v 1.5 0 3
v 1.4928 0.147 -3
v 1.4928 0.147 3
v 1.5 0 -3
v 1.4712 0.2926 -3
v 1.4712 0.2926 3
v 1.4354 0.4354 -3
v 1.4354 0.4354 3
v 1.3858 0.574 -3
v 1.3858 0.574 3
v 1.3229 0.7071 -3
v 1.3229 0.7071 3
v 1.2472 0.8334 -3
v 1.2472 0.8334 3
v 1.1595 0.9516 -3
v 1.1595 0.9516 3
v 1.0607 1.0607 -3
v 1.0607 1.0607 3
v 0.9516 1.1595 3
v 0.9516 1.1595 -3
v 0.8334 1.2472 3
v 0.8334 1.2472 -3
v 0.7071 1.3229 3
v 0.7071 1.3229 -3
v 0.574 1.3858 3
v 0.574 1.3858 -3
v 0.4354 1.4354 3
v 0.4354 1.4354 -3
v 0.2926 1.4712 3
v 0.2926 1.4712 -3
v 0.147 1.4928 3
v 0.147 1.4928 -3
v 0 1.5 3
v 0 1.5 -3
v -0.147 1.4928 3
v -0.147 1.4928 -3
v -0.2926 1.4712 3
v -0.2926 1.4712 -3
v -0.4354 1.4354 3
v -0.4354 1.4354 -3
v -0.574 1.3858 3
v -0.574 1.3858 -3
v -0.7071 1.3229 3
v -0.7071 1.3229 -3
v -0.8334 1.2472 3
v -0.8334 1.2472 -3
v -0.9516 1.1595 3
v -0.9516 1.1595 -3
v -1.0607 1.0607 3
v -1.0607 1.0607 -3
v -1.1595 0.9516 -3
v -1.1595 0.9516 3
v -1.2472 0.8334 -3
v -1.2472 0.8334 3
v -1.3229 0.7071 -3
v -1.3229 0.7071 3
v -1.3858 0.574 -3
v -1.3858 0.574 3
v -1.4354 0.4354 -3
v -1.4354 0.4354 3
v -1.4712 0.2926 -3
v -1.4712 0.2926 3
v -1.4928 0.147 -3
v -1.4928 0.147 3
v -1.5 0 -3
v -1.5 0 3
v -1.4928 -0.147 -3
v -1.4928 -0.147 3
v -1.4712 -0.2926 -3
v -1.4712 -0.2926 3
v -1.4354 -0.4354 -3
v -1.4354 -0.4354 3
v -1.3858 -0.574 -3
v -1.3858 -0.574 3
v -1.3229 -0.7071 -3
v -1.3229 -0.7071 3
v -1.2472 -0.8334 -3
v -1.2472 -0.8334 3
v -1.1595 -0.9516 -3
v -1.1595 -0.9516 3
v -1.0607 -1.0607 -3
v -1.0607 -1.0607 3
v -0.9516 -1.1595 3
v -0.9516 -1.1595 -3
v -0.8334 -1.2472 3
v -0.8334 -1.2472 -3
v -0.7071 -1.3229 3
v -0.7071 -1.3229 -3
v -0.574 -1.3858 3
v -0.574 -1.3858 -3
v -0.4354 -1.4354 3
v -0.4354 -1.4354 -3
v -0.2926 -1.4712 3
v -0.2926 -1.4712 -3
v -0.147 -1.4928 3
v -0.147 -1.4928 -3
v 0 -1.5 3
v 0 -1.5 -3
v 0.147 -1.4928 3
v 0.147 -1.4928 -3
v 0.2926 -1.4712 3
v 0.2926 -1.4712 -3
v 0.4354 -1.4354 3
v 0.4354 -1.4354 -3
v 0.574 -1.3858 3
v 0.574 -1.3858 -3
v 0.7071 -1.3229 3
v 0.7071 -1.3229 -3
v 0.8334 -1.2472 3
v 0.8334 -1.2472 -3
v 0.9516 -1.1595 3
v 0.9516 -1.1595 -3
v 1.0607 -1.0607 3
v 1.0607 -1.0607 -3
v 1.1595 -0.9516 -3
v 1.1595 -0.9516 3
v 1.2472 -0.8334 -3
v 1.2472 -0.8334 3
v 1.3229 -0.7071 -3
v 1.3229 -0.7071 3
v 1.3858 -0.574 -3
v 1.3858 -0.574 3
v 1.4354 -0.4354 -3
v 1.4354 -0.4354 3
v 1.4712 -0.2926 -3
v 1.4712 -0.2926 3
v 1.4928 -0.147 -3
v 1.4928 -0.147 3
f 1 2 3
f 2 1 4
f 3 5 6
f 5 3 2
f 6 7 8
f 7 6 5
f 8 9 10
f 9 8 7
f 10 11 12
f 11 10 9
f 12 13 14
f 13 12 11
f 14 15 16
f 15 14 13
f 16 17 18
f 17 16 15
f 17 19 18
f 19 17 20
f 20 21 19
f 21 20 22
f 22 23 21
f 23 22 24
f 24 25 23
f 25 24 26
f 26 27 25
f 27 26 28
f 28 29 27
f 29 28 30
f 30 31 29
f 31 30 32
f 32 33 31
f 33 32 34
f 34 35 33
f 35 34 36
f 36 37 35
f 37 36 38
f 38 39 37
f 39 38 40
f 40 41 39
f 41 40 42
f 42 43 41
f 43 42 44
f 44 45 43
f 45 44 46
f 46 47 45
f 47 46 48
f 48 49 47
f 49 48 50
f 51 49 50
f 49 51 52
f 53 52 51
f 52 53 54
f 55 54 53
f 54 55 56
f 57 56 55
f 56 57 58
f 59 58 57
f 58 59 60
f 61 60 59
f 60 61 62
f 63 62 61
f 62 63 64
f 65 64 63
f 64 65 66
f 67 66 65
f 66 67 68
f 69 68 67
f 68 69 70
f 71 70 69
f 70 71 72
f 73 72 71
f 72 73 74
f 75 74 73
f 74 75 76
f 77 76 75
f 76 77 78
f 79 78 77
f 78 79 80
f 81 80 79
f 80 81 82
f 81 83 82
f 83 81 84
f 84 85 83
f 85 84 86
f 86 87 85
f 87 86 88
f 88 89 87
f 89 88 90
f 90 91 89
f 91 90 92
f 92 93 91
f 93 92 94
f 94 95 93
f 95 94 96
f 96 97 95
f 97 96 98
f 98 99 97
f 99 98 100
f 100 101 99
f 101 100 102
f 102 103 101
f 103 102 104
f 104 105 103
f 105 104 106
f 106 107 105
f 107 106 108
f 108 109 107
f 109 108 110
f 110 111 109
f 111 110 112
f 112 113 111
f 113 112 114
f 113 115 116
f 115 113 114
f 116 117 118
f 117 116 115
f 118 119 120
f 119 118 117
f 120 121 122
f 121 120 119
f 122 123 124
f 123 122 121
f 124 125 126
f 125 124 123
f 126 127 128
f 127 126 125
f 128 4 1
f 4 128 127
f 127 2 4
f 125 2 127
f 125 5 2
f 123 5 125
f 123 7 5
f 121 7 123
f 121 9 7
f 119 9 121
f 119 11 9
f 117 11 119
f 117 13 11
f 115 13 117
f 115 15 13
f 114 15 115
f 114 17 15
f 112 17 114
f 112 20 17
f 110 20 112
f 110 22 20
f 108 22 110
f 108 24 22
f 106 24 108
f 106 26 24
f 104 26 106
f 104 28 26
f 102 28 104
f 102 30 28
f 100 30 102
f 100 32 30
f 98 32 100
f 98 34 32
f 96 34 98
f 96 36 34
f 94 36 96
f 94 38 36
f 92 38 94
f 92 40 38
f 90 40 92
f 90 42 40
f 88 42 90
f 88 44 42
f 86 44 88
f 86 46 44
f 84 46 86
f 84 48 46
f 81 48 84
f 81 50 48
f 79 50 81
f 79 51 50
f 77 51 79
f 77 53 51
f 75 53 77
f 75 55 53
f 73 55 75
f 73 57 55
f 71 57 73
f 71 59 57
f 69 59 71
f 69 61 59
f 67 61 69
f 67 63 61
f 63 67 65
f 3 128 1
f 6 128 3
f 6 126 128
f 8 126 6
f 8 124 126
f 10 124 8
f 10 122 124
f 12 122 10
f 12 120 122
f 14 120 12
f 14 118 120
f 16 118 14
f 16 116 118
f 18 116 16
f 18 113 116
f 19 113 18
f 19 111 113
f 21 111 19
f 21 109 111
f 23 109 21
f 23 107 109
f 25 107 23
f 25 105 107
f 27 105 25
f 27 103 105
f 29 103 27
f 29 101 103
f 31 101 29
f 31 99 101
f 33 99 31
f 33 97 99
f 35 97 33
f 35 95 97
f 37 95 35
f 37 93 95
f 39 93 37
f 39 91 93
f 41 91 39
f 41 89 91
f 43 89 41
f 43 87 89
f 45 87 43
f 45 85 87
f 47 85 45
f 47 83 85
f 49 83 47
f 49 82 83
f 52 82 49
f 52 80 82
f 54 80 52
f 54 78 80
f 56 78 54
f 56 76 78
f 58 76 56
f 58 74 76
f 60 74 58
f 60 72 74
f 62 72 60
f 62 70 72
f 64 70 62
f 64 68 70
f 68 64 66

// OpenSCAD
$fn=64;

thread_d = 3.0;
length = 6.0;
outer_d = thread_d;

module standoff_pillar(d, h){
    cylinder(d=d, h=h, center=true);
}

standoff_pillar(outer_d, length);
